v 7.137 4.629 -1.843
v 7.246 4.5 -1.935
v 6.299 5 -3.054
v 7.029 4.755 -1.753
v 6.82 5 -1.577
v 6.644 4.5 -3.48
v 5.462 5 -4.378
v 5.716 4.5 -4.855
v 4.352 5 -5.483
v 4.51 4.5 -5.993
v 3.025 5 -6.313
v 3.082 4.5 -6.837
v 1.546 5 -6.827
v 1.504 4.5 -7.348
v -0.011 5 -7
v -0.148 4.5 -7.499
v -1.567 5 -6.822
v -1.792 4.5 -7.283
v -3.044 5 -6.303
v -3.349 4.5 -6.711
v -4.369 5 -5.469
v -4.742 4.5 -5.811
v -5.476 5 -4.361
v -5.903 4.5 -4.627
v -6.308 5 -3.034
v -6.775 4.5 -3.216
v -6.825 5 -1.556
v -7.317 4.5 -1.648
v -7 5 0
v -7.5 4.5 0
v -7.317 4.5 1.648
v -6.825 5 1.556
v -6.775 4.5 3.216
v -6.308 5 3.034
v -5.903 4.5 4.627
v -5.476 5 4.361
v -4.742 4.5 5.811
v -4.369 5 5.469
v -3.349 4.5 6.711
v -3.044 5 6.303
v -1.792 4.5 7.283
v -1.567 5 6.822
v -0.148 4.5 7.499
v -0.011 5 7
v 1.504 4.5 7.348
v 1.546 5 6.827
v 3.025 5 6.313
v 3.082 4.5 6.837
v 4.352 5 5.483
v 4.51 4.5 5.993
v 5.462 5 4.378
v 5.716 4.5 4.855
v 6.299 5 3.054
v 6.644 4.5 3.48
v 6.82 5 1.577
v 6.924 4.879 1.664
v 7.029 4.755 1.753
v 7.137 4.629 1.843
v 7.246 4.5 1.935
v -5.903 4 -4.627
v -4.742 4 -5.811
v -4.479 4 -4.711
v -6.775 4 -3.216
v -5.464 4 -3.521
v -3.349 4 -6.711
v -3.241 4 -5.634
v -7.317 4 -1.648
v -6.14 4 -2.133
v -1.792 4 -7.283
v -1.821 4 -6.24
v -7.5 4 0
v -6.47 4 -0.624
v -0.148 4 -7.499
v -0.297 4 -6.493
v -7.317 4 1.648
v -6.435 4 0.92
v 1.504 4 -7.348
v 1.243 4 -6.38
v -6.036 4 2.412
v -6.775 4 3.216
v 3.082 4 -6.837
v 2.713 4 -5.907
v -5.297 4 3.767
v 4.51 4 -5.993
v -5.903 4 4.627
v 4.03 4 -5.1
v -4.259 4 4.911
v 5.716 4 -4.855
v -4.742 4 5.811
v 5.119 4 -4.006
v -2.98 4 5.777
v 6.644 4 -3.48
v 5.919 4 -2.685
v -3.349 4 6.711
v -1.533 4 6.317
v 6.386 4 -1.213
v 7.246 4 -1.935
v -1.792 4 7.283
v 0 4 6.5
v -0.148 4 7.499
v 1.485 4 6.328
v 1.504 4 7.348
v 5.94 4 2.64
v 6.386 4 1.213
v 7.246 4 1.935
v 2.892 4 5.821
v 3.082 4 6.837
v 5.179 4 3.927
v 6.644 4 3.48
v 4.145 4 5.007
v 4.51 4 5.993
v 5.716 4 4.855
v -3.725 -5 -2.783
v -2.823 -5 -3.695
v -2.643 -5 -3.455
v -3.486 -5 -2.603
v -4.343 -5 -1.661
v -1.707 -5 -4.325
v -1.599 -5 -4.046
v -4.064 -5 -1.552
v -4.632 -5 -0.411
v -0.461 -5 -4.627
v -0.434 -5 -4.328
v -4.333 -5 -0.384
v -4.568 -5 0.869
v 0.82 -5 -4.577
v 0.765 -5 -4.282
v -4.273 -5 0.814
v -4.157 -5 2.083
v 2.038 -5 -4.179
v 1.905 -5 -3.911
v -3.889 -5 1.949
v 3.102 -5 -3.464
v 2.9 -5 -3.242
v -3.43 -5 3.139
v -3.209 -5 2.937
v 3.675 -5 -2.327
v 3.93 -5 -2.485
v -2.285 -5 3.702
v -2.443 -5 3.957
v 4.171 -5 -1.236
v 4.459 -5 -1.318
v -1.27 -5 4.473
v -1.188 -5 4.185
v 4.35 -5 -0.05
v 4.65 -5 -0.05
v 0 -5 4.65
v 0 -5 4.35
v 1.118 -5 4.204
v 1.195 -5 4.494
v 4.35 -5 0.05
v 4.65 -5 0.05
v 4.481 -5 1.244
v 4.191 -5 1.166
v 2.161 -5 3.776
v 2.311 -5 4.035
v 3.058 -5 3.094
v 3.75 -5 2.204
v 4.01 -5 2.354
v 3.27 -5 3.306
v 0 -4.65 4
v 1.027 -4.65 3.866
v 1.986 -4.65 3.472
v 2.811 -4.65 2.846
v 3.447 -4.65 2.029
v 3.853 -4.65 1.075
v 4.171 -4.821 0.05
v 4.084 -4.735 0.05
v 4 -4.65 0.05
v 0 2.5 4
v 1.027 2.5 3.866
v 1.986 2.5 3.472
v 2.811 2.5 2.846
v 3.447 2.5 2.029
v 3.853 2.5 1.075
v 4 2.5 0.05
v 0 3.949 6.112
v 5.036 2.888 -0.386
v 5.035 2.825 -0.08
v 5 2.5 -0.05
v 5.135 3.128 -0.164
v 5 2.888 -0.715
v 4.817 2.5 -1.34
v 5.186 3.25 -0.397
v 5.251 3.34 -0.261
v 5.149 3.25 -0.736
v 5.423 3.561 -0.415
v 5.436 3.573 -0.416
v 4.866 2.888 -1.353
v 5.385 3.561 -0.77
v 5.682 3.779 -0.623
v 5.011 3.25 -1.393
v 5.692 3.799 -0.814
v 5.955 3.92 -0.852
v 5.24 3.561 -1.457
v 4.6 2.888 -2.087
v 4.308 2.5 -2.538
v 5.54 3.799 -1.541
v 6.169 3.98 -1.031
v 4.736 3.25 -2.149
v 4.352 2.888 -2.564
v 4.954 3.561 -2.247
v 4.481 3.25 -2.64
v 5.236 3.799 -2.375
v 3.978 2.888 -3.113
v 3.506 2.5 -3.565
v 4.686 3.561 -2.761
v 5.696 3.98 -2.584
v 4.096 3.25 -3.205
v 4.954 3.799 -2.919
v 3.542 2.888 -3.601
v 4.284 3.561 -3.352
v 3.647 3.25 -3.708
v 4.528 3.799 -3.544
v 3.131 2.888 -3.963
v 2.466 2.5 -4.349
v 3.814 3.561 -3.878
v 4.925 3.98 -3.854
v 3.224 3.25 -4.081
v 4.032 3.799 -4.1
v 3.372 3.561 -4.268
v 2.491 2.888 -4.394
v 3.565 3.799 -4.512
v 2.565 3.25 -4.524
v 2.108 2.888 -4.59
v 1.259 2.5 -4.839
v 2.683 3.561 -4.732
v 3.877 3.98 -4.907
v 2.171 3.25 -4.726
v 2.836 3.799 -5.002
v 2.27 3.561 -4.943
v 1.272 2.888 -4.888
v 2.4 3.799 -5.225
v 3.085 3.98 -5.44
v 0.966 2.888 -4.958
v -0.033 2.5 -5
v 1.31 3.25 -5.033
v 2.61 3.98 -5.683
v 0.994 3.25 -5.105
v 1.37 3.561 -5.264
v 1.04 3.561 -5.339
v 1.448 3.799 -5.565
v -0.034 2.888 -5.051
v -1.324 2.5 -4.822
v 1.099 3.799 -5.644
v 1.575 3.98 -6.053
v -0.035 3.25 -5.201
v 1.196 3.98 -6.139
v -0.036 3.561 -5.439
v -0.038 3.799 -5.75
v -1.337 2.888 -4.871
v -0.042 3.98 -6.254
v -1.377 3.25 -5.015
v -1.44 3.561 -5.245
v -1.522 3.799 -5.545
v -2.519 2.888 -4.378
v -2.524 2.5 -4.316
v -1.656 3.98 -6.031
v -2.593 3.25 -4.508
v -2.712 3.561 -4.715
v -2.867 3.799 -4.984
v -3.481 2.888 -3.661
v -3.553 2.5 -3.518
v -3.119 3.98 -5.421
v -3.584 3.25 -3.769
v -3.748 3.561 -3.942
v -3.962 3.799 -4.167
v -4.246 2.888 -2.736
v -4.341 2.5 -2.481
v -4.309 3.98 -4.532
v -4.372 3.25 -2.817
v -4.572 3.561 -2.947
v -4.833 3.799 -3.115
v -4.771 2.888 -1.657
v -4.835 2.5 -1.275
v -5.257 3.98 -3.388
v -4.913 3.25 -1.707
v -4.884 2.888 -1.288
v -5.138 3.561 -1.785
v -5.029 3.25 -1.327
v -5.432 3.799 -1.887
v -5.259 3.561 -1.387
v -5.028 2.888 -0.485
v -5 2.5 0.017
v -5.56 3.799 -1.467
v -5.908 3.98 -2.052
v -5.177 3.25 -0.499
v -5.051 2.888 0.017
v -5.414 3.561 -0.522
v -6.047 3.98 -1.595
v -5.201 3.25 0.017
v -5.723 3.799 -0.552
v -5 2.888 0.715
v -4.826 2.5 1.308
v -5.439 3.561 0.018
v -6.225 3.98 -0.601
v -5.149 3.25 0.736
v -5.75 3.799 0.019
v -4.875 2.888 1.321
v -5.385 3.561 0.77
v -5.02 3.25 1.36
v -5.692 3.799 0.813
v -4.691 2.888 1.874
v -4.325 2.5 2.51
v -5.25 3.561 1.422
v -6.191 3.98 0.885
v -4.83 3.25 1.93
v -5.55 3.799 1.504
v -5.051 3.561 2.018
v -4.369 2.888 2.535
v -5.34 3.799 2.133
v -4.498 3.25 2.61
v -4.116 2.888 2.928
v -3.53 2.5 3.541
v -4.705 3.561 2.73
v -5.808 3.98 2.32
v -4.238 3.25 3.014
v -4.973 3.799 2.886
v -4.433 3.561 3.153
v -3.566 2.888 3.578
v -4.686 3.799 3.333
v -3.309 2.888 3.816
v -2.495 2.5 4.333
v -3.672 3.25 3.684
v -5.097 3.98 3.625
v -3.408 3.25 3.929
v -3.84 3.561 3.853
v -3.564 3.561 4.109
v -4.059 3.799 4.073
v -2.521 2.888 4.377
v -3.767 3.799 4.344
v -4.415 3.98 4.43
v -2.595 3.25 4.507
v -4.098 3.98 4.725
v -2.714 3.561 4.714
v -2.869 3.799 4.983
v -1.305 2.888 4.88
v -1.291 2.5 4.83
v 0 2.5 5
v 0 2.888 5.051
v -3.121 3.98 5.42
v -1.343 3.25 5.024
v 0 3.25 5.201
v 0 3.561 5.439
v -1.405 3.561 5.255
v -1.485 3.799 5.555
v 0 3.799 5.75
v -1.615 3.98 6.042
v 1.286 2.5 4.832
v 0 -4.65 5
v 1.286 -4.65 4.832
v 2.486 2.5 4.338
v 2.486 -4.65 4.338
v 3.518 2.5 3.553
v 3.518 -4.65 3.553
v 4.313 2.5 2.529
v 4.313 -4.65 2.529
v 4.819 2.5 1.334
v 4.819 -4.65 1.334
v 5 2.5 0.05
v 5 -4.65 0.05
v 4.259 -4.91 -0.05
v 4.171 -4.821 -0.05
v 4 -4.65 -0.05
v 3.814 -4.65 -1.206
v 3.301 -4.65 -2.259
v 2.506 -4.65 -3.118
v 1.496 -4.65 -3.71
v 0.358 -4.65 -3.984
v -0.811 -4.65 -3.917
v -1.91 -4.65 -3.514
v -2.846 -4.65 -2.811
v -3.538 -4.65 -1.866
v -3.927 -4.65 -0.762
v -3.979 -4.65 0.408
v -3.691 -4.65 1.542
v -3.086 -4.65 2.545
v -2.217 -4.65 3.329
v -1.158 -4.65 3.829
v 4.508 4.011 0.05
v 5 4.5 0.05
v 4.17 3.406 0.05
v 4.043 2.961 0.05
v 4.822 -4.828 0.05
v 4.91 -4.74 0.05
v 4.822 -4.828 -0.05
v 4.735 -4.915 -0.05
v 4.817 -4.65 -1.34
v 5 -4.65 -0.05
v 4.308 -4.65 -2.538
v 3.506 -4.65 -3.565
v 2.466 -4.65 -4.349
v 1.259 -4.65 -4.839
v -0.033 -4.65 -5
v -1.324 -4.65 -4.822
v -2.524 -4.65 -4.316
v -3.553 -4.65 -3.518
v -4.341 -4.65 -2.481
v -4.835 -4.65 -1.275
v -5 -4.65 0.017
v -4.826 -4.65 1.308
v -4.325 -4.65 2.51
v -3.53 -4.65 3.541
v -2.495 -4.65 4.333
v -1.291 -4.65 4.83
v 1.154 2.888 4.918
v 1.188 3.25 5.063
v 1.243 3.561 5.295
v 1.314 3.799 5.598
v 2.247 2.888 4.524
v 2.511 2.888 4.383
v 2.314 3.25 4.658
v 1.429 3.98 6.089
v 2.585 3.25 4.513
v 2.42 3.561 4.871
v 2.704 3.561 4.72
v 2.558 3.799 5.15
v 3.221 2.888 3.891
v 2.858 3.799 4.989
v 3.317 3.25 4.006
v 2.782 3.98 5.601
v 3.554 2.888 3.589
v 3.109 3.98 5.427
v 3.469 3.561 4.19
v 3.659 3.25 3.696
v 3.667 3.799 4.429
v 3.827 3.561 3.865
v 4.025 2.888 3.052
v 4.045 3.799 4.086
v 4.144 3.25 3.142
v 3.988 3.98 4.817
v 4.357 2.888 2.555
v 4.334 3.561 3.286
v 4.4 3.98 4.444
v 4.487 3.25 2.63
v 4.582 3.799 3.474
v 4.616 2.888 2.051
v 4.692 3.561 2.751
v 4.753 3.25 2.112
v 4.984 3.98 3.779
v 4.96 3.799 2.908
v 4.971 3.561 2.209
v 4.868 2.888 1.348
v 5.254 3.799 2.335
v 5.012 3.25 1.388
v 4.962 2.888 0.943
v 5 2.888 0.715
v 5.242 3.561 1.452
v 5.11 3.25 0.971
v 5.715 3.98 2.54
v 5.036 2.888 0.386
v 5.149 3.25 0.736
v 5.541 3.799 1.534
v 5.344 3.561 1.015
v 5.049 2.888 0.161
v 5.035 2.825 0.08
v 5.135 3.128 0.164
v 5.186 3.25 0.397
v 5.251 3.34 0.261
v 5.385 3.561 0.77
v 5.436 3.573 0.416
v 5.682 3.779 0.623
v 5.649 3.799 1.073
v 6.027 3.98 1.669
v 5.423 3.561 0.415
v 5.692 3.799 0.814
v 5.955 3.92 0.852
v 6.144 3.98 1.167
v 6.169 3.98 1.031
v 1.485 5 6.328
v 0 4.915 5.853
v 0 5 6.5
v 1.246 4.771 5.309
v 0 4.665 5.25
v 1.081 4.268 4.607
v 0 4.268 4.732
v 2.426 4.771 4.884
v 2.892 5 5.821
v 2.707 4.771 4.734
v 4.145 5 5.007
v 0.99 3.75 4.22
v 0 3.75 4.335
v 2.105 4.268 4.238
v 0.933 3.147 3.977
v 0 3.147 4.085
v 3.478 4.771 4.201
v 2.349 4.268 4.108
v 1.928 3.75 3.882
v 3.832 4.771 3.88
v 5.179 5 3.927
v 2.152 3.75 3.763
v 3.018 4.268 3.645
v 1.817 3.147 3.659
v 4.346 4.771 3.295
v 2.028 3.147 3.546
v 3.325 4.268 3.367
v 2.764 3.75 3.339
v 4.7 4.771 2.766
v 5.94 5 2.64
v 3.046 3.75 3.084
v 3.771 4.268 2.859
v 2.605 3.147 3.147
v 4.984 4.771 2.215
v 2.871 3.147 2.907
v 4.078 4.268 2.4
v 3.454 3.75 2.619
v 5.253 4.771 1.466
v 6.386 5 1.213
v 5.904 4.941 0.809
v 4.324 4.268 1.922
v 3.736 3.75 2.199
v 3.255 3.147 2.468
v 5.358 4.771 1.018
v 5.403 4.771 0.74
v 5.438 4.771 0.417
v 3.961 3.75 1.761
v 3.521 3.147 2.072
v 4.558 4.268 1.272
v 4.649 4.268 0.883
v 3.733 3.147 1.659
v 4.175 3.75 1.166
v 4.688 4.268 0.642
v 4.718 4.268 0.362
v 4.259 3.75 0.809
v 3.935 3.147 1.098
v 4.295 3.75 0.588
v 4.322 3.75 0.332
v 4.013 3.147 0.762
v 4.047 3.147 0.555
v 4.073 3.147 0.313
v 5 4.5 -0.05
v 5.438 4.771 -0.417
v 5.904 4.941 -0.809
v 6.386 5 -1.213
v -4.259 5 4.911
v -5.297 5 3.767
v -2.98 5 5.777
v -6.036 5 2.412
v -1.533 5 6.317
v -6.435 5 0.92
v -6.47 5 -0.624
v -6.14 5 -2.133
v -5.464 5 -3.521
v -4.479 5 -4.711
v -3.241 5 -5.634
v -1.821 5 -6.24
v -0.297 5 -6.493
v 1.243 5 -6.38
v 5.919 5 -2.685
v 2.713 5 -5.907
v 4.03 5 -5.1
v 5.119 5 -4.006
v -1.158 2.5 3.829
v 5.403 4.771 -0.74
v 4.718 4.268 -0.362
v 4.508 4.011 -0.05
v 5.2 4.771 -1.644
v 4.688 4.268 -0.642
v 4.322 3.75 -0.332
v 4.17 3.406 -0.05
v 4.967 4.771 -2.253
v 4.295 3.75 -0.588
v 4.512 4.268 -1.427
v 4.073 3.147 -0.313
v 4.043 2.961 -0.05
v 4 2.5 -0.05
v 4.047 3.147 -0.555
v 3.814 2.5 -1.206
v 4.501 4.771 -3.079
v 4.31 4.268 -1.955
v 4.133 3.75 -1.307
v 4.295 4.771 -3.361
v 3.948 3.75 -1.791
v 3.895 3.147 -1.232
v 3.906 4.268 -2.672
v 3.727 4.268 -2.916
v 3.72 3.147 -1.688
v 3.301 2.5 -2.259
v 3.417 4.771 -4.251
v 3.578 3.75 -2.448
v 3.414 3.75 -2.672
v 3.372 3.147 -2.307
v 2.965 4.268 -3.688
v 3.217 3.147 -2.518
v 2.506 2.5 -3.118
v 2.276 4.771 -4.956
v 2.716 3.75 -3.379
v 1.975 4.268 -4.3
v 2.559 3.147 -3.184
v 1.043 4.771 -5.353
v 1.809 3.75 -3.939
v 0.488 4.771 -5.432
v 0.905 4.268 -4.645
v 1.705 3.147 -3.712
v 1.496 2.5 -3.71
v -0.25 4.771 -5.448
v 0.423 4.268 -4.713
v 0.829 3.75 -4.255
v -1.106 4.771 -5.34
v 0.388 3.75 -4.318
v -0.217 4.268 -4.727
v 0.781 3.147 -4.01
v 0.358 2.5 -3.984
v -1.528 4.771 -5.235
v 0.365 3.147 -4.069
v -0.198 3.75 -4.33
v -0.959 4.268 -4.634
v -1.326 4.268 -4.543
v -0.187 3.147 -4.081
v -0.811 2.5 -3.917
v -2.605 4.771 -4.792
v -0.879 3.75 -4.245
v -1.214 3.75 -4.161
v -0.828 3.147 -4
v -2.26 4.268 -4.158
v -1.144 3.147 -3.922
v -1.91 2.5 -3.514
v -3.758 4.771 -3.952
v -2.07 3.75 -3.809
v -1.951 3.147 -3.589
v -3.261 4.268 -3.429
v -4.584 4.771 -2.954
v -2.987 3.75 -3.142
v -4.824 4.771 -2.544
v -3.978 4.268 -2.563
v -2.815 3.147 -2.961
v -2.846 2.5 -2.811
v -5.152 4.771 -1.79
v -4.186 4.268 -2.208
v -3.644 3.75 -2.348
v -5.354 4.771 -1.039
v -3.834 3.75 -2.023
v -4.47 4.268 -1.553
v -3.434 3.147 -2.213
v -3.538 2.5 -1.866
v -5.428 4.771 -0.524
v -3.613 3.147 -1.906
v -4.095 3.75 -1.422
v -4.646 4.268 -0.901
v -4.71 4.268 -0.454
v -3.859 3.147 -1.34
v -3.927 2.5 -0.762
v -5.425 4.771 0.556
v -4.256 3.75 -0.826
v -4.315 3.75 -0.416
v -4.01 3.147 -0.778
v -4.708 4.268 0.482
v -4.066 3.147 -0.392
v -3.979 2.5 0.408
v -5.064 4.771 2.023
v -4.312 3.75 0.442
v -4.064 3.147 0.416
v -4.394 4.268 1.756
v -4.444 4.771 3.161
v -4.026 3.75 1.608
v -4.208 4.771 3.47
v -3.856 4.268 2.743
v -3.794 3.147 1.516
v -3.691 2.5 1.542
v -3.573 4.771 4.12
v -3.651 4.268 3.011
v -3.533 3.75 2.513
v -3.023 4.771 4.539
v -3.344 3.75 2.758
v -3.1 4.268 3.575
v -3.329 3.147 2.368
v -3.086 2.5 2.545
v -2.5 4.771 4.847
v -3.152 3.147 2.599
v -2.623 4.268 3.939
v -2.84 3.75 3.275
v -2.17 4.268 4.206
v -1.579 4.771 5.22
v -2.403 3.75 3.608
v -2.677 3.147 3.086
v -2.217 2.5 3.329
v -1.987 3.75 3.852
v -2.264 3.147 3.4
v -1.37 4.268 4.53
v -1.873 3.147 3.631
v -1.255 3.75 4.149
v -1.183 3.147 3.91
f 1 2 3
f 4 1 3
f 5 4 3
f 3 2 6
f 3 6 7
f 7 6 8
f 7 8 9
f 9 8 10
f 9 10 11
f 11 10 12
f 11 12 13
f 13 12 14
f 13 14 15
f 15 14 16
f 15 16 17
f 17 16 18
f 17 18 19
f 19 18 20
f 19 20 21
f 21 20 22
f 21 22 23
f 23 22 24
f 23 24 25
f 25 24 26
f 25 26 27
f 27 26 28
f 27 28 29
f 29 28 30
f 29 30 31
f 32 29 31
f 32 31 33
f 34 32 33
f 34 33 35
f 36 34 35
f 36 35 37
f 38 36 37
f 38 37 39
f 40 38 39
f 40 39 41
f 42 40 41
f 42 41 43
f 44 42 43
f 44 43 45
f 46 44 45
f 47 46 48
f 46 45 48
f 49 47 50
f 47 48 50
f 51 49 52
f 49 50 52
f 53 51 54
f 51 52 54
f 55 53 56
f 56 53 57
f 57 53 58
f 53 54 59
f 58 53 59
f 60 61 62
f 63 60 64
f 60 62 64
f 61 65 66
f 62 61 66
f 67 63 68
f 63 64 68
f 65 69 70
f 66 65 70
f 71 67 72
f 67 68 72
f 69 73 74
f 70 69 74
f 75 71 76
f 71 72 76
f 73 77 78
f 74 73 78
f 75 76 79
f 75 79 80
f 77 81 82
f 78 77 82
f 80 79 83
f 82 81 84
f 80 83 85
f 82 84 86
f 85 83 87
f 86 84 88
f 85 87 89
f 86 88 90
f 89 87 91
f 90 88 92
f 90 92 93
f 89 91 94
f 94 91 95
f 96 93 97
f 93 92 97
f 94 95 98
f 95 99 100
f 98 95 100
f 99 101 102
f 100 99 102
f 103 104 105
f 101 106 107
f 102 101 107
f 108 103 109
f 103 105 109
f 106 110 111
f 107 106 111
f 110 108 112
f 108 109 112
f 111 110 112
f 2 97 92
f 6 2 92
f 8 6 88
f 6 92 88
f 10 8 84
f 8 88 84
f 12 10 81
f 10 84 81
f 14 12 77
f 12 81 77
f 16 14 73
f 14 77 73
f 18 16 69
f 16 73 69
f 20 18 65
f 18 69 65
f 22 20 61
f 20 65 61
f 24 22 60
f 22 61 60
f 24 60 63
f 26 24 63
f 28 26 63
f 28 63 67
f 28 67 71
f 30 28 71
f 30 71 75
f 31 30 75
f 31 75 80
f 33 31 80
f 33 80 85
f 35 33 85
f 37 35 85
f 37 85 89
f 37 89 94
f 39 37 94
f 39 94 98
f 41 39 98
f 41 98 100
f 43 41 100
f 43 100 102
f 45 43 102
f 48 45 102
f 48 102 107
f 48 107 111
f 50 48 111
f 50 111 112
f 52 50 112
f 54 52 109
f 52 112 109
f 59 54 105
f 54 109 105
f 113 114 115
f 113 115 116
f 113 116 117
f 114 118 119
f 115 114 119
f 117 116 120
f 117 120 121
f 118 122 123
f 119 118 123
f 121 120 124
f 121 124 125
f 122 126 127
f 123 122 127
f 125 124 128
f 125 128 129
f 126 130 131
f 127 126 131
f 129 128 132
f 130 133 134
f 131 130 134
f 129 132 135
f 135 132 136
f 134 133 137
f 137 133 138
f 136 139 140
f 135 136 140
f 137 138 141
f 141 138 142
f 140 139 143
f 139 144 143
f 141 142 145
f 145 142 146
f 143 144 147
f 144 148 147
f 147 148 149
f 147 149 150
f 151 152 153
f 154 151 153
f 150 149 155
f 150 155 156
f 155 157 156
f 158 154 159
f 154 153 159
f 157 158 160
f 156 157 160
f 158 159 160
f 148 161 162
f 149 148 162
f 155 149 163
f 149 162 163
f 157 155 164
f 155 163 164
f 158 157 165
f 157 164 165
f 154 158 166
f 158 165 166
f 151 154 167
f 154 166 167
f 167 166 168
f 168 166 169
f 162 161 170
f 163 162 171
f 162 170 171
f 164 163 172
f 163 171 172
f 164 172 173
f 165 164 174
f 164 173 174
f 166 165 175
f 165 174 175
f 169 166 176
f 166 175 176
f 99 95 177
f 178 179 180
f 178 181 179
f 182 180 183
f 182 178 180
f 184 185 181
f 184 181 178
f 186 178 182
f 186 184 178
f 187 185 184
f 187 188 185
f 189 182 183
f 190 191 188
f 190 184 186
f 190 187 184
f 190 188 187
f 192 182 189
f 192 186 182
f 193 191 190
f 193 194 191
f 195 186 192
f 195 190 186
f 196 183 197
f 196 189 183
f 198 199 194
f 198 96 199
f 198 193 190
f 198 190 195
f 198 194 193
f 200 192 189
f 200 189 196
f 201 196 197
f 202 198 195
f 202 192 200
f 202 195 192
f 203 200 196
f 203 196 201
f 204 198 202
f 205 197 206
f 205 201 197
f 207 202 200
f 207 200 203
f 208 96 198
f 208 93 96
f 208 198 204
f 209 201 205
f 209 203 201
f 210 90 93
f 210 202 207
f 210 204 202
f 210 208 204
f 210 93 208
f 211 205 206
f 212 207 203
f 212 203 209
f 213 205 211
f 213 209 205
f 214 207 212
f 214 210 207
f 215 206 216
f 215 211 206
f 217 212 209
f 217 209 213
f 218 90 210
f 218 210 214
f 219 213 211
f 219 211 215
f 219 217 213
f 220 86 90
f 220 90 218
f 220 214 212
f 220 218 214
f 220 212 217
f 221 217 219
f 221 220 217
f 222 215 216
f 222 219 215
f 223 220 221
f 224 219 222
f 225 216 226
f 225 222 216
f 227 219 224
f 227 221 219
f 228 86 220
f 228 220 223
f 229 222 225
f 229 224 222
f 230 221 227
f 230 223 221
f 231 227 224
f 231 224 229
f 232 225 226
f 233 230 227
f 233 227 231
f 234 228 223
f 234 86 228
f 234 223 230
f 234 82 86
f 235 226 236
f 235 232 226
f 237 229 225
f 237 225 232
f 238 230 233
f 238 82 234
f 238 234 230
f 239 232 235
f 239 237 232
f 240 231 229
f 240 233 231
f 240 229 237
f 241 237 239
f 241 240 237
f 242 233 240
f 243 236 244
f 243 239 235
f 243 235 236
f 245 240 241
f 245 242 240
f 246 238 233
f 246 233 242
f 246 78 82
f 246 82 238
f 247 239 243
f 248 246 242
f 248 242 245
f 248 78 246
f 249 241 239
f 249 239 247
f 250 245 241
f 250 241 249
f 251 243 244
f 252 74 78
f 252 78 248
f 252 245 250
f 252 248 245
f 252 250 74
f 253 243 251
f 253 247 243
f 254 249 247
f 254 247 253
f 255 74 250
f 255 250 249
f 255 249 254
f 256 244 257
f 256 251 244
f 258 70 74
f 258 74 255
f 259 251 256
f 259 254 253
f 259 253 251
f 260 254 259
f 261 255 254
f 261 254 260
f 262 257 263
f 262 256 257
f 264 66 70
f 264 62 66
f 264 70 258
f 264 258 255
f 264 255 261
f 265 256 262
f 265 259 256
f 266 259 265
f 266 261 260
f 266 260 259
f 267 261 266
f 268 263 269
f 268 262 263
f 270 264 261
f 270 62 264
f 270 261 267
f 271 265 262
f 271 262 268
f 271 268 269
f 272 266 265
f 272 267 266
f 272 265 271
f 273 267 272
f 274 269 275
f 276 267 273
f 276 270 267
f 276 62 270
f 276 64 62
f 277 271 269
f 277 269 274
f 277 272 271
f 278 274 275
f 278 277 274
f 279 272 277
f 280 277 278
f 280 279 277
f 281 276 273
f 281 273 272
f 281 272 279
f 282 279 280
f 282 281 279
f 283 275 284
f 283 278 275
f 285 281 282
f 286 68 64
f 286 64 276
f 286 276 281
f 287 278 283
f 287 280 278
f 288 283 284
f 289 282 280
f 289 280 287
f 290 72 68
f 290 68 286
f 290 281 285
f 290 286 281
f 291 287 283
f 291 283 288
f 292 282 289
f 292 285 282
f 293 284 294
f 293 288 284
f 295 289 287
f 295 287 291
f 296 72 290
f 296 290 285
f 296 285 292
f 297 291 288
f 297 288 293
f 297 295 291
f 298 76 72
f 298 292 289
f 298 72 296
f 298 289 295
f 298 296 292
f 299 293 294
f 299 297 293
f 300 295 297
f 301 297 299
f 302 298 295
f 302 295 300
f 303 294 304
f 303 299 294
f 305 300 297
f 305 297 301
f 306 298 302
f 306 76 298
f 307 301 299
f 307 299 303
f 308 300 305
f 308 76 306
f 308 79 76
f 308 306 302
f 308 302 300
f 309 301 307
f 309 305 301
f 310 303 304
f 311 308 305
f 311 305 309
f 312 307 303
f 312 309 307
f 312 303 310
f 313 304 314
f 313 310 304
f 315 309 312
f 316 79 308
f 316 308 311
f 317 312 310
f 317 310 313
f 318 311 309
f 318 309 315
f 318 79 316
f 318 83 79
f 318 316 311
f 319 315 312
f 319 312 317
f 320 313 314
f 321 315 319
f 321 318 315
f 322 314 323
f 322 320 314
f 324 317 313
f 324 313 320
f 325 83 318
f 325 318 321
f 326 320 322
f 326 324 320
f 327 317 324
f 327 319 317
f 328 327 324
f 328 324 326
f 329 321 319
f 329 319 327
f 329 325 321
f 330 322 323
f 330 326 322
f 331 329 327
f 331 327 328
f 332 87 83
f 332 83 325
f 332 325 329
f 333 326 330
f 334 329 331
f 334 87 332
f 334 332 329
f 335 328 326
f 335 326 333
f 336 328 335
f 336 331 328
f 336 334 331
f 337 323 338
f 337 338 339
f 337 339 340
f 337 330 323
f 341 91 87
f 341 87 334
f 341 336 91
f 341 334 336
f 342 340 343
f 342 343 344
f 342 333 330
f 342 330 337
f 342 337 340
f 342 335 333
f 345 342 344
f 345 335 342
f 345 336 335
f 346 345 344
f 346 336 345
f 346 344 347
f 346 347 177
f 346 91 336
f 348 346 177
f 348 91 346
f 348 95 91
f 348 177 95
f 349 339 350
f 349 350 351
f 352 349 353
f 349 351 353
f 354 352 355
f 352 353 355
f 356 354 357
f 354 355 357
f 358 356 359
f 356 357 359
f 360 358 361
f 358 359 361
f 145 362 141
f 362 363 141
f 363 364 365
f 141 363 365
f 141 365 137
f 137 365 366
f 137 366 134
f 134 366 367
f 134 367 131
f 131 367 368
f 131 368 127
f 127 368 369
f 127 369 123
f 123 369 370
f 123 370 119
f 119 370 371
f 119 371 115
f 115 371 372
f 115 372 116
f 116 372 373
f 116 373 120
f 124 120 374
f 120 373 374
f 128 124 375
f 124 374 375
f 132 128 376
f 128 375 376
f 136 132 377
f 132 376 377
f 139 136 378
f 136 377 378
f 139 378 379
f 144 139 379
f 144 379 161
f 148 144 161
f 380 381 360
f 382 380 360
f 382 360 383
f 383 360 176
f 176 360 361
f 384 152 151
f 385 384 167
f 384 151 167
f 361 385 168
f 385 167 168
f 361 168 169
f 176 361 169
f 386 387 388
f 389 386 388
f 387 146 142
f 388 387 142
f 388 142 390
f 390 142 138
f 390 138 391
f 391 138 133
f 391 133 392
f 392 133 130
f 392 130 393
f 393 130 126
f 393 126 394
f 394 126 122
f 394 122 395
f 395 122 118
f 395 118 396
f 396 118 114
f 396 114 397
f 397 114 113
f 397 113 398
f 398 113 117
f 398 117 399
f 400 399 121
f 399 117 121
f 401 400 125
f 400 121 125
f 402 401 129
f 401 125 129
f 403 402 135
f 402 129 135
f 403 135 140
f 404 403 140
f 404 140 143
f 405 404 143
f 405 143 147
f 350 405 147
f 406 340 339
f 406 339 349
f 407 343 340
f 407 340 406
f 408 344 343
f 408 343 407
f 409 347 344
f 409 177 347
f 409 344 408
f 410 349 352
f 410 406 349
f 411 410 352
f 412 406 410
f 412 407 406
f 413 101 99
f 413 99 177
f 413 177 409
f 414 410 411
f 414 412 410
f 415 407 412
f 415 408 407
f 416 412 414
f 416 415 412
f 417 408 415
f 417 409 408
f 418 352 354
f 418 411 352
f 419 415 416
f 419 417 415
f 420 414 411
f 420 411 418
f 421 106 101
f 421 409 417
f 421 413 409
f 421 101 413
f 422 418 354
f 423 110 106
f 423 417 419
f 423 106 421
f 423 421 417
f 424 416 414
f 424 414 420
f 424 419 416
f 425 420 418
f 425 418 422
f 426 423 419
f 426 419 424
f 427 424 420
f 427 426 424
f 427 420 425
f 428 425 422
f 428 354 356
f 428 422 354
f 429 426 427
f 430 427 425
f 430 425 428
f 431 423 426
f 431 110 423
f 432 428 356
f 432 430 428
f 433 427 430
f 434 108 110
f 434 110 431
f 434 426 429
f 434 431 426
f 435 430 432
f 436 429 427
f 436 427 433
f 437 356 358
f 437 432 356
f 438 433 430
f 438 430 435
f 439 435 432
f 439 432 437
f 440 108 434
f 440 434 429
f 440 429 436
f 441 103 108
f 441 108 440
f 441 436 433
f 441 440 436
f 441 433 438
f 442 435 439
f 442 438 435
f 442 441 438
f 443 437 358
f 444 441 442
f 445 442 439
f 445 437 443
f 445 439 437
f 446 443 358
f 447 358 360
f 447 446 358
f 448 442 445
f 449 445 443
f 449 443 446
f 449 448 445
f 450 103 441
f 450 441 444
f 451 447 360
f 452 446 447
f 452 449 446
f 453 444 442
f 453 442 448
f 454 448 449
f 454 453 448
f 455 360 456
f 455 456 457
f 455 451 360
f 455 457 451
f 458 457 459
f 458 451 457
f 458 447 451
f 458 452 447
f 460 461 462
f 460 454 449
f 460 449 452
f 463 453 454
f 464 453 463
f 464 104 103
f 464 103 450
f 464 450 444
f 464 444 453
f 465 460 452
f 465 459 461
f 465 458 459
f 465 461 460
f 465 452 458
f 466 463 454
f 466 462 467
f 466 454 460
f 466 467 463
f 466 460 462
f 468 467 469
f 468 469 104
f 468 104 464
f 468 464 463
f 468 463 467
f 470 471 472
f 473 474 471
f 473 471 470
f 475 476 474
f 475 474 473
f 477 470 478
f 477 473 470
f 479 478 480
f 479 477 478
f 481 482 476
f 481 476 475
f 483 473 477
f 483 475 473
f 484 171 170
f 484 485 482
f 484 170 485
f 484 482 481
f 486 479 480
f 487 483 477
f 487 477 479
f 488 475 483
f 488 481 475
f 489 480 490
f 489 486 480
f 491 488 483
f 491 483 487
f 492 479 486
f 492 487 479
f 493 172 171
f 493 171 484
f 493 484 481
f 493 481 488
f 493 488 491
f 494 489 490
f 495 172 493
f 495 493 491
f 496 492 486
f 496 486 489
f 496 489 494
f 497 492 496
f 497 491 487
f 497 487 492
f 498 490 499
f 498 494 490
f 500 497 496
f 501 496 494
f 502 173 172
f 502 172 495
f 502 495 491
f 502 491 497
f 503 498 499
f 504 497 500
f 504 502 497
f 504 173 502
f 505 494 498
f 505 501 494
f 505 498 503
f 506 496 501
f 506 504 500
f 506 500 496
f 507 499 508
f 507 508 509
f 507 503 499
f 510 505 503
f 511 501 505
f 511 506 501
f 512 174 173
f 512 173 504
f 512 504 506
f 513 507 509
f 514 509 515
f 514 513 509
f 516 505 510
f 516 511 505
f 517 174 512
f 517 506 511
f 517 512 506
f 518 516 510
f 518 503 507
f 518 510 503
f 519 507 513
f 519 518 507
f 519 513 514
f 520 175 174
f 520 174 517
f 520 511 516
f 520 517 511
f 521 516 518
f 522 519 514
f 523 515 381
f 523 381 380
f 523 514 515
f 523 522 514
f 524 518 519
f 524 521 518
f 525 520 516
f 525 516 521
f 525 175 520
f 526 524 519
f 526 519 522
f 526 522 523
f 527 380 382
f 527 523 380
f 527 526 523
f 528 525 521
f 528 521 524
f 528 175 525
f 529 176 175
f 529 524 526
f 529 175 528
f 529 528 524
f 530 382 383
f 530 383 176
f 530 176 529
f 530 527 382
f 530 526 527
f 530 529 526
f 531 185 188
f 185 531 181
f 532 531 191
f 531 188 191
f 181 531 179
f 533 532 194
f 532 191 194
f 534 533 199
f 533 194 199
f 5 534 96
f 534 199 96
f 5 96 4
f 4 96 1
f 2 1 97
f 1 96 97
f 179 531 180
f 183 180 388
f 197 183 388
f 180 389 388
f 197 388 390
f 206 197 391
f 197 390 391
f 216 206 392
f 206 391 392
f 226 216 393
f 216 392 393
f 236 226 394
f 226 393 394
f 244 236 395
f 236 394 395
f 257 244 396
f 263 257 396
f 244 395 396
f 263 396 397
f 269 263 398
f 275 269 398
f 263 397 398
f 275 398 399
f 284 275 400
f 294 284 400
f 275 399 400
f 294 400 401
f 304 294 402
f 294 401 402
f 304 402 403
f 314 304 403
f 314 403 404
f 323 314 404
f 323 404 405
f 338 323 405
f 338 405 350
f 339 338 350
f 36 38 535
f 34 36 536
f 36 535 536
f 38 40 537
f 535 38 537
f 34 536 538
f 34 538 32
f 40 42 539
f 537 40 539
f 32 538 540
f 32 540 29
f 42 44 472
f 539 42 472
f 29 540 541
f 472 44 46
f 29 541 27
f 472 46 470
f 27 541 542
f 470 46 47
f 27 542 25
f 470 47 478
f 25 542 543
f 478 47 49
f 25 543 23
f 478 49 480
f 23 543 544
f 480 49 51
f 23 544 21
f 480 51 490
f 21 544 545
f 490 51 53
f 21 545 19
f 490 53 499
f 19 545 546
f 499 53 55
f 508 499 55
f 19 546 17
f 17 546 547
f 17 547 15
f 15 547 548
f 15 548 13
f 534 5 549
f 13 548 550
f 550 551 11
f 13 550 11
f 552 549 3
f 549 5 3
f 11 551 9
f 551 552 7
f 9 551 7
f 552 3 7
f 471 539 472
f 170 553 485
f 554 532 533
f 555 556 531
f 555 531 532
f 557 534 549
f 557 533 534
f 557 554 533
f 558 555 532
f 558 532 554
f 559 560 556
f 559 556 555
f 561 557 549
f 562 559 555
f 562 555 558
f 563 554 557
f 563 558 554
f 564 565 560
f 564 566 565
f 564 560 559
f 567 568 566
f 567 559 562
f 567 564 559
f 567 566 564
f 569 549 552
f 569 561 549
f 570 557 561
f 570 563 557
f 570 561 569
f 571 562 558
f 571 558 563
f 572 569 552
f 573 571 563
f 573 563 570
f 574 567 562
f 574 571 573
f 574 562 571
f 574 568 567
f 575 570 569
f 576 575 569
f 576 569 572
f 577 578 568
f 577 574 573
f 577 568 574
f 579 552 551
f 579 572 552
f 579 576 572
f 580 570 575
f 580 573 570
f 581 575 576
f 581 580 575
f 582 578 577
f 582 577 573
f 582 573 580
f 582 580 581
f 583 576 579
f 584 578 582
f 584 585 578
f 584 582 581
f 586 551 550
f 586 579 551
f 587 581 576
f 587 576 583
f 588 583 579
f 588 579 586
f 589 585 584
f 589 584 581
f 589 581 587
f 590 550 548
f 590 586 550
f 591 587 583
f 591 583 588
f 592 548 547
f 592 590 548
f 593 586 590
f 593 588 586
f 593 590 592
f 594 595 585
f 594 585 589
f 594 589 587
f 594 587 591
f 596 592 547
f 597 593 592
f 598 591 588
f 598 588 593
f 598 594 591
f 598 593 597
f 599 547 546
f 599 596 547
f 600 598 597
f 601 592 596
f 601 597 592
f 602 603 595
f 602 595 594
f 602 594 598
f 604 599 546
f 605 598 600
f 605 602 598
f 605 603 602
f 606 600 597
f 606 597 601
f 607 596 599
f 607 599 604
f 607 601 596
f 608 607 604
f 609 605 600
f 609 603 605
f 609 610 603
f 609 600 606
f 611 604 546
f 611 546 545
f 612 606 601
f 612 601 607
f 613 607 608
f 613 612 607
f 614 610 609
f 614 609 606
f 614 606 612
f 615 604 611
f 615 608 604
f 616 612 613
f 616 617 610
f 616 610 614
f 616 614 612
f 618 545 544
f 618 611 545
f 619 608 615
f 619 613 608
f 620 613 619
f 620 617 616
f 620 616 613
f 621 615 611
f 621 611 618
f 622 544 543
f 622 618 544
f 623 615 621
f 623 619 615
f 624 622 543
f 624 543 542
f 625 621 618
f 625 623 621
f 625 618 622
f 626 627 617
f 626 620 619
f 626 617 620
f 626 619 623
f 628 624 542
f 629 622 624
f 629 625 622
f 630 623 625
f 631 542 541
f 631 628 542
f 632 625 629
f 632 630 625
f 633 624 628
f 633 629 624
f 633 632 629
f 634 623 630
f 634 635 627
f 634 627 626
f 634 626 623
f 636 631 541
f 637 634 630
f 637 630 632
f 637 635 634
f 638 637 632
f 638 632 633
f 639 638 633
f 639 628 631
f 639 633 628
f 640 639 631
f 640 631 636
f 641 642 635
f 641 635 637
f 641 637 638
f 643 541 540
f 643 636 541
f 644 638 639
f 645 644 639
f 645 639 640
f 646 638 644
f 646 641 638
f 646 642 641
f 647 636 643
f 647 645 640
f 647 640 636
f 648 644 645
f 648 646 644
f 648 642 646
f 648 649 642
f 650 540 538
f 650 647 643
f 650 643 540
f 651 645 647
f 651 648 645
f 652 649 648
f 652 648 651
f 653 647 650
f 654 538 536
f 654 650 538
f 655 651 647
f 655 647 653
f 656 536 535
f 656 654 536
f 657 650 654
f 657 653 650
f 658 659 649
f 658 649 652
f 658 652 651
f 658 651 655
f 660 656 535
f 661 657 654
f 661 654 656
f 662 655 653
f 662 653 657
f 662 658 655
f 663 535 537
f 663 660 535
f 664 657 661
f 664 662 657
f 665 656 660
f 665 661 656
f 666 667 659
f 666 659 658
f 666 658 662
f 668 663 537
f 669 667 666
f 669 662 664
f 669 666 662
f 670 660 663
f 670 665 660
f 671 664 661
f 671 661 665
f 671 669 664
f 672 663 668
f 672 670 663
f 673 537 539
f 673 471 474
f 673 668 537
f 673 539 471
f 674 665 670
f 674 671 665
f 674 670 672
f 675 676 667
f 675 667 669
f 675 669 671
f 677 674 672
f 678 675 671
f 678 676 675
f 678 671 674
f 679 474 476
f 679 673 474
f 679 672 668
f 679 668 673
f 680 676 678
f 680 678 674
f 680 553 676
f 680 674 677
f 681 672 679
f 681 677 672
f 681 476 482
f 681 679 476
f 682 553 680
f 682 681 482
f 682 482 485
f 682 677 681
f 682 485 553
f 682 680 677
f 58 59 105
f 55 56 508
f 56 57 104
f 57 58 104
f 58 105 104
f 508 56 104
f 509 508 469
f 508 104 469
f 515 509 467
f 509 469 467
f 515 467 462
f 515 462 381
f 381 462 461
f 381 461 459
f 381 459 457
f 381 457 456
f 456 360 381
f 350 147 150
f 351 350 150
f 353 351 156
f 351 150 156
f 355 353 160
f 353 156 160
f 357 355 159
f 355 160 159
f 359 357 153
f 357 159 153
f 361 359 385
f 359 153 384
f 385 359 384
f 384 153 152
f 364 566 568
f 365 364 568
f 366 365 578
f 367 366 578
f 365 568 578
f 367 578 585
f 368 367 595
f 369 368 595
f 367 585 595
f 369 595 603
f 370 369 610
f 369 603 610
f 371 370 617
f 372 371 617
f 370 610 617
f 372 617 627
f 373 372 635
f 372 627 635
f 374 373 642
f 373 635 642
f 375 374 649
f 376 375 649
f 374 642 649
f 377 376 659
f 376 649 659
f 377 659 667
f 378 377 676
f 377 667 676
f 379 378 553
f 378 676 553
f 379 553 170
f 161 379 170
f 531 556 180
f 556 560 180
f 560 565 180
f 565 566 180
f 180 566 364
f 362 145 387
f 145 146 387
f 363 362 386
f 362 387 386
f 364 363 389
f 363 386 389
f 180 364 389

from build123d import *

# Parameters (mm, degrees)
F2_SIZE  = 0.35
F3_R     = 1.5
F4_R     = 2.5
F5_SIZE  = 0.5
F7_DEPTH = 10.0010001


with BuildPart() as f1:
    # F0 (on Right) → F1 (revolve)
    with BuildSketch(Plane.YZ):
        Polygon((5, 4), (5, 7.5), (4, 7.5), (4, 5), (-5, 5), (-5, 4), align=None)
    revolve(axis=Axis((0, 0, 0), (0, 1, 0)))

    # F2
    f2_edges = [f1.edges().sort_by_distance(p)[0] for p in [
        (0, -5, -5),
        (0, -5, -4),
    ]]
    chamfer(f2_edges, length=F2_SIZE)

    # F3
    f3_edges = [f1.edges().sort_by_distance(p)[0] for p in [
        (0, 4, -5),
    ]]
    fillet(f3_edges, radius=F3_R)

    # F4
    f4_edges = [f1.edges().sort_by_distance(p)[0] for p in [
        (0, 5, -4),
    ]]
    fillet(f4_edges, radius=F4_R)

    # F5
    f5_edges = [f1.edges().sort_by_distance(p)[0] for p in [
        (0, 5, -7.5),
    ]]
    chamfer(f5_edges, length=F5_SIZE)

    # F6 (on face) → F7 (cut, through all)
    with BuildSketch(Plane.XZ.offset(5)):
        with BuildLine():
            Line((4.9997499937, 0.05), (4.649731175, 0.05))
            ThreePointArc((4.649731175, 0.05), (4.6499327933, 0.0250003613), (4.65, 0))
            ThreePointArc((4.65, 0), (4.6499327933, -0.0250003613), (4.649731175, -0.05))
            Line((4.649731175, -0.05), (4.9997499937, -0.05))
            Line((4.9997499937, -0.05), (8, -2.5675086737))
            Line((8, -2.5675086737), (8, 2.5675086737))
            Line((8, 2.5675086737), (4.9997499937, 0.05))
        make_face()
        with BuildLine():
            Line((4.3497126342, 0.05), (3.9996874878, 0.05))
            Line((3.9996874878, 0.05), (3.9996874878, -0.05))
            Line((3.9996874878, -0.05), (4.3497126342, -0.05))
            ThreePointArc((4.3497126342, -0.05), (4.349928158, -0.0250004129), (4.35, 0))
            ThreePointArc((4.35, 0), (4.349928158, 0.0250004129), (4.3497126342, 0.05))
        make_face()
        with BuildLine():
            Line((4.649731175, 0.05), (4.3497126342, 0.05))
            ThreePointArc((4.3497126342, 0.05), (4.349928158, 0.0250004129), (4.35, 0))
            ThreePointArc((4.35, 0), (4.349928158, -0.0250004129), (4.3497126342, -0.05))
            Line((4.3497126342, -0.05), (4.649731175, -0.05))
            ThreePointArc((4.649731175, -0.05), (4.6499327933, -0.0250003613), (4.65, 0))
            ThreePointArc((4.65, 0), (4.6499327933, 0.0250003613), (4.649731175, 0.05))
        make_face()
    extrude(amount=-F7_DEPTH, mode=Mode.SUBTRACT)


solid = f1.part
